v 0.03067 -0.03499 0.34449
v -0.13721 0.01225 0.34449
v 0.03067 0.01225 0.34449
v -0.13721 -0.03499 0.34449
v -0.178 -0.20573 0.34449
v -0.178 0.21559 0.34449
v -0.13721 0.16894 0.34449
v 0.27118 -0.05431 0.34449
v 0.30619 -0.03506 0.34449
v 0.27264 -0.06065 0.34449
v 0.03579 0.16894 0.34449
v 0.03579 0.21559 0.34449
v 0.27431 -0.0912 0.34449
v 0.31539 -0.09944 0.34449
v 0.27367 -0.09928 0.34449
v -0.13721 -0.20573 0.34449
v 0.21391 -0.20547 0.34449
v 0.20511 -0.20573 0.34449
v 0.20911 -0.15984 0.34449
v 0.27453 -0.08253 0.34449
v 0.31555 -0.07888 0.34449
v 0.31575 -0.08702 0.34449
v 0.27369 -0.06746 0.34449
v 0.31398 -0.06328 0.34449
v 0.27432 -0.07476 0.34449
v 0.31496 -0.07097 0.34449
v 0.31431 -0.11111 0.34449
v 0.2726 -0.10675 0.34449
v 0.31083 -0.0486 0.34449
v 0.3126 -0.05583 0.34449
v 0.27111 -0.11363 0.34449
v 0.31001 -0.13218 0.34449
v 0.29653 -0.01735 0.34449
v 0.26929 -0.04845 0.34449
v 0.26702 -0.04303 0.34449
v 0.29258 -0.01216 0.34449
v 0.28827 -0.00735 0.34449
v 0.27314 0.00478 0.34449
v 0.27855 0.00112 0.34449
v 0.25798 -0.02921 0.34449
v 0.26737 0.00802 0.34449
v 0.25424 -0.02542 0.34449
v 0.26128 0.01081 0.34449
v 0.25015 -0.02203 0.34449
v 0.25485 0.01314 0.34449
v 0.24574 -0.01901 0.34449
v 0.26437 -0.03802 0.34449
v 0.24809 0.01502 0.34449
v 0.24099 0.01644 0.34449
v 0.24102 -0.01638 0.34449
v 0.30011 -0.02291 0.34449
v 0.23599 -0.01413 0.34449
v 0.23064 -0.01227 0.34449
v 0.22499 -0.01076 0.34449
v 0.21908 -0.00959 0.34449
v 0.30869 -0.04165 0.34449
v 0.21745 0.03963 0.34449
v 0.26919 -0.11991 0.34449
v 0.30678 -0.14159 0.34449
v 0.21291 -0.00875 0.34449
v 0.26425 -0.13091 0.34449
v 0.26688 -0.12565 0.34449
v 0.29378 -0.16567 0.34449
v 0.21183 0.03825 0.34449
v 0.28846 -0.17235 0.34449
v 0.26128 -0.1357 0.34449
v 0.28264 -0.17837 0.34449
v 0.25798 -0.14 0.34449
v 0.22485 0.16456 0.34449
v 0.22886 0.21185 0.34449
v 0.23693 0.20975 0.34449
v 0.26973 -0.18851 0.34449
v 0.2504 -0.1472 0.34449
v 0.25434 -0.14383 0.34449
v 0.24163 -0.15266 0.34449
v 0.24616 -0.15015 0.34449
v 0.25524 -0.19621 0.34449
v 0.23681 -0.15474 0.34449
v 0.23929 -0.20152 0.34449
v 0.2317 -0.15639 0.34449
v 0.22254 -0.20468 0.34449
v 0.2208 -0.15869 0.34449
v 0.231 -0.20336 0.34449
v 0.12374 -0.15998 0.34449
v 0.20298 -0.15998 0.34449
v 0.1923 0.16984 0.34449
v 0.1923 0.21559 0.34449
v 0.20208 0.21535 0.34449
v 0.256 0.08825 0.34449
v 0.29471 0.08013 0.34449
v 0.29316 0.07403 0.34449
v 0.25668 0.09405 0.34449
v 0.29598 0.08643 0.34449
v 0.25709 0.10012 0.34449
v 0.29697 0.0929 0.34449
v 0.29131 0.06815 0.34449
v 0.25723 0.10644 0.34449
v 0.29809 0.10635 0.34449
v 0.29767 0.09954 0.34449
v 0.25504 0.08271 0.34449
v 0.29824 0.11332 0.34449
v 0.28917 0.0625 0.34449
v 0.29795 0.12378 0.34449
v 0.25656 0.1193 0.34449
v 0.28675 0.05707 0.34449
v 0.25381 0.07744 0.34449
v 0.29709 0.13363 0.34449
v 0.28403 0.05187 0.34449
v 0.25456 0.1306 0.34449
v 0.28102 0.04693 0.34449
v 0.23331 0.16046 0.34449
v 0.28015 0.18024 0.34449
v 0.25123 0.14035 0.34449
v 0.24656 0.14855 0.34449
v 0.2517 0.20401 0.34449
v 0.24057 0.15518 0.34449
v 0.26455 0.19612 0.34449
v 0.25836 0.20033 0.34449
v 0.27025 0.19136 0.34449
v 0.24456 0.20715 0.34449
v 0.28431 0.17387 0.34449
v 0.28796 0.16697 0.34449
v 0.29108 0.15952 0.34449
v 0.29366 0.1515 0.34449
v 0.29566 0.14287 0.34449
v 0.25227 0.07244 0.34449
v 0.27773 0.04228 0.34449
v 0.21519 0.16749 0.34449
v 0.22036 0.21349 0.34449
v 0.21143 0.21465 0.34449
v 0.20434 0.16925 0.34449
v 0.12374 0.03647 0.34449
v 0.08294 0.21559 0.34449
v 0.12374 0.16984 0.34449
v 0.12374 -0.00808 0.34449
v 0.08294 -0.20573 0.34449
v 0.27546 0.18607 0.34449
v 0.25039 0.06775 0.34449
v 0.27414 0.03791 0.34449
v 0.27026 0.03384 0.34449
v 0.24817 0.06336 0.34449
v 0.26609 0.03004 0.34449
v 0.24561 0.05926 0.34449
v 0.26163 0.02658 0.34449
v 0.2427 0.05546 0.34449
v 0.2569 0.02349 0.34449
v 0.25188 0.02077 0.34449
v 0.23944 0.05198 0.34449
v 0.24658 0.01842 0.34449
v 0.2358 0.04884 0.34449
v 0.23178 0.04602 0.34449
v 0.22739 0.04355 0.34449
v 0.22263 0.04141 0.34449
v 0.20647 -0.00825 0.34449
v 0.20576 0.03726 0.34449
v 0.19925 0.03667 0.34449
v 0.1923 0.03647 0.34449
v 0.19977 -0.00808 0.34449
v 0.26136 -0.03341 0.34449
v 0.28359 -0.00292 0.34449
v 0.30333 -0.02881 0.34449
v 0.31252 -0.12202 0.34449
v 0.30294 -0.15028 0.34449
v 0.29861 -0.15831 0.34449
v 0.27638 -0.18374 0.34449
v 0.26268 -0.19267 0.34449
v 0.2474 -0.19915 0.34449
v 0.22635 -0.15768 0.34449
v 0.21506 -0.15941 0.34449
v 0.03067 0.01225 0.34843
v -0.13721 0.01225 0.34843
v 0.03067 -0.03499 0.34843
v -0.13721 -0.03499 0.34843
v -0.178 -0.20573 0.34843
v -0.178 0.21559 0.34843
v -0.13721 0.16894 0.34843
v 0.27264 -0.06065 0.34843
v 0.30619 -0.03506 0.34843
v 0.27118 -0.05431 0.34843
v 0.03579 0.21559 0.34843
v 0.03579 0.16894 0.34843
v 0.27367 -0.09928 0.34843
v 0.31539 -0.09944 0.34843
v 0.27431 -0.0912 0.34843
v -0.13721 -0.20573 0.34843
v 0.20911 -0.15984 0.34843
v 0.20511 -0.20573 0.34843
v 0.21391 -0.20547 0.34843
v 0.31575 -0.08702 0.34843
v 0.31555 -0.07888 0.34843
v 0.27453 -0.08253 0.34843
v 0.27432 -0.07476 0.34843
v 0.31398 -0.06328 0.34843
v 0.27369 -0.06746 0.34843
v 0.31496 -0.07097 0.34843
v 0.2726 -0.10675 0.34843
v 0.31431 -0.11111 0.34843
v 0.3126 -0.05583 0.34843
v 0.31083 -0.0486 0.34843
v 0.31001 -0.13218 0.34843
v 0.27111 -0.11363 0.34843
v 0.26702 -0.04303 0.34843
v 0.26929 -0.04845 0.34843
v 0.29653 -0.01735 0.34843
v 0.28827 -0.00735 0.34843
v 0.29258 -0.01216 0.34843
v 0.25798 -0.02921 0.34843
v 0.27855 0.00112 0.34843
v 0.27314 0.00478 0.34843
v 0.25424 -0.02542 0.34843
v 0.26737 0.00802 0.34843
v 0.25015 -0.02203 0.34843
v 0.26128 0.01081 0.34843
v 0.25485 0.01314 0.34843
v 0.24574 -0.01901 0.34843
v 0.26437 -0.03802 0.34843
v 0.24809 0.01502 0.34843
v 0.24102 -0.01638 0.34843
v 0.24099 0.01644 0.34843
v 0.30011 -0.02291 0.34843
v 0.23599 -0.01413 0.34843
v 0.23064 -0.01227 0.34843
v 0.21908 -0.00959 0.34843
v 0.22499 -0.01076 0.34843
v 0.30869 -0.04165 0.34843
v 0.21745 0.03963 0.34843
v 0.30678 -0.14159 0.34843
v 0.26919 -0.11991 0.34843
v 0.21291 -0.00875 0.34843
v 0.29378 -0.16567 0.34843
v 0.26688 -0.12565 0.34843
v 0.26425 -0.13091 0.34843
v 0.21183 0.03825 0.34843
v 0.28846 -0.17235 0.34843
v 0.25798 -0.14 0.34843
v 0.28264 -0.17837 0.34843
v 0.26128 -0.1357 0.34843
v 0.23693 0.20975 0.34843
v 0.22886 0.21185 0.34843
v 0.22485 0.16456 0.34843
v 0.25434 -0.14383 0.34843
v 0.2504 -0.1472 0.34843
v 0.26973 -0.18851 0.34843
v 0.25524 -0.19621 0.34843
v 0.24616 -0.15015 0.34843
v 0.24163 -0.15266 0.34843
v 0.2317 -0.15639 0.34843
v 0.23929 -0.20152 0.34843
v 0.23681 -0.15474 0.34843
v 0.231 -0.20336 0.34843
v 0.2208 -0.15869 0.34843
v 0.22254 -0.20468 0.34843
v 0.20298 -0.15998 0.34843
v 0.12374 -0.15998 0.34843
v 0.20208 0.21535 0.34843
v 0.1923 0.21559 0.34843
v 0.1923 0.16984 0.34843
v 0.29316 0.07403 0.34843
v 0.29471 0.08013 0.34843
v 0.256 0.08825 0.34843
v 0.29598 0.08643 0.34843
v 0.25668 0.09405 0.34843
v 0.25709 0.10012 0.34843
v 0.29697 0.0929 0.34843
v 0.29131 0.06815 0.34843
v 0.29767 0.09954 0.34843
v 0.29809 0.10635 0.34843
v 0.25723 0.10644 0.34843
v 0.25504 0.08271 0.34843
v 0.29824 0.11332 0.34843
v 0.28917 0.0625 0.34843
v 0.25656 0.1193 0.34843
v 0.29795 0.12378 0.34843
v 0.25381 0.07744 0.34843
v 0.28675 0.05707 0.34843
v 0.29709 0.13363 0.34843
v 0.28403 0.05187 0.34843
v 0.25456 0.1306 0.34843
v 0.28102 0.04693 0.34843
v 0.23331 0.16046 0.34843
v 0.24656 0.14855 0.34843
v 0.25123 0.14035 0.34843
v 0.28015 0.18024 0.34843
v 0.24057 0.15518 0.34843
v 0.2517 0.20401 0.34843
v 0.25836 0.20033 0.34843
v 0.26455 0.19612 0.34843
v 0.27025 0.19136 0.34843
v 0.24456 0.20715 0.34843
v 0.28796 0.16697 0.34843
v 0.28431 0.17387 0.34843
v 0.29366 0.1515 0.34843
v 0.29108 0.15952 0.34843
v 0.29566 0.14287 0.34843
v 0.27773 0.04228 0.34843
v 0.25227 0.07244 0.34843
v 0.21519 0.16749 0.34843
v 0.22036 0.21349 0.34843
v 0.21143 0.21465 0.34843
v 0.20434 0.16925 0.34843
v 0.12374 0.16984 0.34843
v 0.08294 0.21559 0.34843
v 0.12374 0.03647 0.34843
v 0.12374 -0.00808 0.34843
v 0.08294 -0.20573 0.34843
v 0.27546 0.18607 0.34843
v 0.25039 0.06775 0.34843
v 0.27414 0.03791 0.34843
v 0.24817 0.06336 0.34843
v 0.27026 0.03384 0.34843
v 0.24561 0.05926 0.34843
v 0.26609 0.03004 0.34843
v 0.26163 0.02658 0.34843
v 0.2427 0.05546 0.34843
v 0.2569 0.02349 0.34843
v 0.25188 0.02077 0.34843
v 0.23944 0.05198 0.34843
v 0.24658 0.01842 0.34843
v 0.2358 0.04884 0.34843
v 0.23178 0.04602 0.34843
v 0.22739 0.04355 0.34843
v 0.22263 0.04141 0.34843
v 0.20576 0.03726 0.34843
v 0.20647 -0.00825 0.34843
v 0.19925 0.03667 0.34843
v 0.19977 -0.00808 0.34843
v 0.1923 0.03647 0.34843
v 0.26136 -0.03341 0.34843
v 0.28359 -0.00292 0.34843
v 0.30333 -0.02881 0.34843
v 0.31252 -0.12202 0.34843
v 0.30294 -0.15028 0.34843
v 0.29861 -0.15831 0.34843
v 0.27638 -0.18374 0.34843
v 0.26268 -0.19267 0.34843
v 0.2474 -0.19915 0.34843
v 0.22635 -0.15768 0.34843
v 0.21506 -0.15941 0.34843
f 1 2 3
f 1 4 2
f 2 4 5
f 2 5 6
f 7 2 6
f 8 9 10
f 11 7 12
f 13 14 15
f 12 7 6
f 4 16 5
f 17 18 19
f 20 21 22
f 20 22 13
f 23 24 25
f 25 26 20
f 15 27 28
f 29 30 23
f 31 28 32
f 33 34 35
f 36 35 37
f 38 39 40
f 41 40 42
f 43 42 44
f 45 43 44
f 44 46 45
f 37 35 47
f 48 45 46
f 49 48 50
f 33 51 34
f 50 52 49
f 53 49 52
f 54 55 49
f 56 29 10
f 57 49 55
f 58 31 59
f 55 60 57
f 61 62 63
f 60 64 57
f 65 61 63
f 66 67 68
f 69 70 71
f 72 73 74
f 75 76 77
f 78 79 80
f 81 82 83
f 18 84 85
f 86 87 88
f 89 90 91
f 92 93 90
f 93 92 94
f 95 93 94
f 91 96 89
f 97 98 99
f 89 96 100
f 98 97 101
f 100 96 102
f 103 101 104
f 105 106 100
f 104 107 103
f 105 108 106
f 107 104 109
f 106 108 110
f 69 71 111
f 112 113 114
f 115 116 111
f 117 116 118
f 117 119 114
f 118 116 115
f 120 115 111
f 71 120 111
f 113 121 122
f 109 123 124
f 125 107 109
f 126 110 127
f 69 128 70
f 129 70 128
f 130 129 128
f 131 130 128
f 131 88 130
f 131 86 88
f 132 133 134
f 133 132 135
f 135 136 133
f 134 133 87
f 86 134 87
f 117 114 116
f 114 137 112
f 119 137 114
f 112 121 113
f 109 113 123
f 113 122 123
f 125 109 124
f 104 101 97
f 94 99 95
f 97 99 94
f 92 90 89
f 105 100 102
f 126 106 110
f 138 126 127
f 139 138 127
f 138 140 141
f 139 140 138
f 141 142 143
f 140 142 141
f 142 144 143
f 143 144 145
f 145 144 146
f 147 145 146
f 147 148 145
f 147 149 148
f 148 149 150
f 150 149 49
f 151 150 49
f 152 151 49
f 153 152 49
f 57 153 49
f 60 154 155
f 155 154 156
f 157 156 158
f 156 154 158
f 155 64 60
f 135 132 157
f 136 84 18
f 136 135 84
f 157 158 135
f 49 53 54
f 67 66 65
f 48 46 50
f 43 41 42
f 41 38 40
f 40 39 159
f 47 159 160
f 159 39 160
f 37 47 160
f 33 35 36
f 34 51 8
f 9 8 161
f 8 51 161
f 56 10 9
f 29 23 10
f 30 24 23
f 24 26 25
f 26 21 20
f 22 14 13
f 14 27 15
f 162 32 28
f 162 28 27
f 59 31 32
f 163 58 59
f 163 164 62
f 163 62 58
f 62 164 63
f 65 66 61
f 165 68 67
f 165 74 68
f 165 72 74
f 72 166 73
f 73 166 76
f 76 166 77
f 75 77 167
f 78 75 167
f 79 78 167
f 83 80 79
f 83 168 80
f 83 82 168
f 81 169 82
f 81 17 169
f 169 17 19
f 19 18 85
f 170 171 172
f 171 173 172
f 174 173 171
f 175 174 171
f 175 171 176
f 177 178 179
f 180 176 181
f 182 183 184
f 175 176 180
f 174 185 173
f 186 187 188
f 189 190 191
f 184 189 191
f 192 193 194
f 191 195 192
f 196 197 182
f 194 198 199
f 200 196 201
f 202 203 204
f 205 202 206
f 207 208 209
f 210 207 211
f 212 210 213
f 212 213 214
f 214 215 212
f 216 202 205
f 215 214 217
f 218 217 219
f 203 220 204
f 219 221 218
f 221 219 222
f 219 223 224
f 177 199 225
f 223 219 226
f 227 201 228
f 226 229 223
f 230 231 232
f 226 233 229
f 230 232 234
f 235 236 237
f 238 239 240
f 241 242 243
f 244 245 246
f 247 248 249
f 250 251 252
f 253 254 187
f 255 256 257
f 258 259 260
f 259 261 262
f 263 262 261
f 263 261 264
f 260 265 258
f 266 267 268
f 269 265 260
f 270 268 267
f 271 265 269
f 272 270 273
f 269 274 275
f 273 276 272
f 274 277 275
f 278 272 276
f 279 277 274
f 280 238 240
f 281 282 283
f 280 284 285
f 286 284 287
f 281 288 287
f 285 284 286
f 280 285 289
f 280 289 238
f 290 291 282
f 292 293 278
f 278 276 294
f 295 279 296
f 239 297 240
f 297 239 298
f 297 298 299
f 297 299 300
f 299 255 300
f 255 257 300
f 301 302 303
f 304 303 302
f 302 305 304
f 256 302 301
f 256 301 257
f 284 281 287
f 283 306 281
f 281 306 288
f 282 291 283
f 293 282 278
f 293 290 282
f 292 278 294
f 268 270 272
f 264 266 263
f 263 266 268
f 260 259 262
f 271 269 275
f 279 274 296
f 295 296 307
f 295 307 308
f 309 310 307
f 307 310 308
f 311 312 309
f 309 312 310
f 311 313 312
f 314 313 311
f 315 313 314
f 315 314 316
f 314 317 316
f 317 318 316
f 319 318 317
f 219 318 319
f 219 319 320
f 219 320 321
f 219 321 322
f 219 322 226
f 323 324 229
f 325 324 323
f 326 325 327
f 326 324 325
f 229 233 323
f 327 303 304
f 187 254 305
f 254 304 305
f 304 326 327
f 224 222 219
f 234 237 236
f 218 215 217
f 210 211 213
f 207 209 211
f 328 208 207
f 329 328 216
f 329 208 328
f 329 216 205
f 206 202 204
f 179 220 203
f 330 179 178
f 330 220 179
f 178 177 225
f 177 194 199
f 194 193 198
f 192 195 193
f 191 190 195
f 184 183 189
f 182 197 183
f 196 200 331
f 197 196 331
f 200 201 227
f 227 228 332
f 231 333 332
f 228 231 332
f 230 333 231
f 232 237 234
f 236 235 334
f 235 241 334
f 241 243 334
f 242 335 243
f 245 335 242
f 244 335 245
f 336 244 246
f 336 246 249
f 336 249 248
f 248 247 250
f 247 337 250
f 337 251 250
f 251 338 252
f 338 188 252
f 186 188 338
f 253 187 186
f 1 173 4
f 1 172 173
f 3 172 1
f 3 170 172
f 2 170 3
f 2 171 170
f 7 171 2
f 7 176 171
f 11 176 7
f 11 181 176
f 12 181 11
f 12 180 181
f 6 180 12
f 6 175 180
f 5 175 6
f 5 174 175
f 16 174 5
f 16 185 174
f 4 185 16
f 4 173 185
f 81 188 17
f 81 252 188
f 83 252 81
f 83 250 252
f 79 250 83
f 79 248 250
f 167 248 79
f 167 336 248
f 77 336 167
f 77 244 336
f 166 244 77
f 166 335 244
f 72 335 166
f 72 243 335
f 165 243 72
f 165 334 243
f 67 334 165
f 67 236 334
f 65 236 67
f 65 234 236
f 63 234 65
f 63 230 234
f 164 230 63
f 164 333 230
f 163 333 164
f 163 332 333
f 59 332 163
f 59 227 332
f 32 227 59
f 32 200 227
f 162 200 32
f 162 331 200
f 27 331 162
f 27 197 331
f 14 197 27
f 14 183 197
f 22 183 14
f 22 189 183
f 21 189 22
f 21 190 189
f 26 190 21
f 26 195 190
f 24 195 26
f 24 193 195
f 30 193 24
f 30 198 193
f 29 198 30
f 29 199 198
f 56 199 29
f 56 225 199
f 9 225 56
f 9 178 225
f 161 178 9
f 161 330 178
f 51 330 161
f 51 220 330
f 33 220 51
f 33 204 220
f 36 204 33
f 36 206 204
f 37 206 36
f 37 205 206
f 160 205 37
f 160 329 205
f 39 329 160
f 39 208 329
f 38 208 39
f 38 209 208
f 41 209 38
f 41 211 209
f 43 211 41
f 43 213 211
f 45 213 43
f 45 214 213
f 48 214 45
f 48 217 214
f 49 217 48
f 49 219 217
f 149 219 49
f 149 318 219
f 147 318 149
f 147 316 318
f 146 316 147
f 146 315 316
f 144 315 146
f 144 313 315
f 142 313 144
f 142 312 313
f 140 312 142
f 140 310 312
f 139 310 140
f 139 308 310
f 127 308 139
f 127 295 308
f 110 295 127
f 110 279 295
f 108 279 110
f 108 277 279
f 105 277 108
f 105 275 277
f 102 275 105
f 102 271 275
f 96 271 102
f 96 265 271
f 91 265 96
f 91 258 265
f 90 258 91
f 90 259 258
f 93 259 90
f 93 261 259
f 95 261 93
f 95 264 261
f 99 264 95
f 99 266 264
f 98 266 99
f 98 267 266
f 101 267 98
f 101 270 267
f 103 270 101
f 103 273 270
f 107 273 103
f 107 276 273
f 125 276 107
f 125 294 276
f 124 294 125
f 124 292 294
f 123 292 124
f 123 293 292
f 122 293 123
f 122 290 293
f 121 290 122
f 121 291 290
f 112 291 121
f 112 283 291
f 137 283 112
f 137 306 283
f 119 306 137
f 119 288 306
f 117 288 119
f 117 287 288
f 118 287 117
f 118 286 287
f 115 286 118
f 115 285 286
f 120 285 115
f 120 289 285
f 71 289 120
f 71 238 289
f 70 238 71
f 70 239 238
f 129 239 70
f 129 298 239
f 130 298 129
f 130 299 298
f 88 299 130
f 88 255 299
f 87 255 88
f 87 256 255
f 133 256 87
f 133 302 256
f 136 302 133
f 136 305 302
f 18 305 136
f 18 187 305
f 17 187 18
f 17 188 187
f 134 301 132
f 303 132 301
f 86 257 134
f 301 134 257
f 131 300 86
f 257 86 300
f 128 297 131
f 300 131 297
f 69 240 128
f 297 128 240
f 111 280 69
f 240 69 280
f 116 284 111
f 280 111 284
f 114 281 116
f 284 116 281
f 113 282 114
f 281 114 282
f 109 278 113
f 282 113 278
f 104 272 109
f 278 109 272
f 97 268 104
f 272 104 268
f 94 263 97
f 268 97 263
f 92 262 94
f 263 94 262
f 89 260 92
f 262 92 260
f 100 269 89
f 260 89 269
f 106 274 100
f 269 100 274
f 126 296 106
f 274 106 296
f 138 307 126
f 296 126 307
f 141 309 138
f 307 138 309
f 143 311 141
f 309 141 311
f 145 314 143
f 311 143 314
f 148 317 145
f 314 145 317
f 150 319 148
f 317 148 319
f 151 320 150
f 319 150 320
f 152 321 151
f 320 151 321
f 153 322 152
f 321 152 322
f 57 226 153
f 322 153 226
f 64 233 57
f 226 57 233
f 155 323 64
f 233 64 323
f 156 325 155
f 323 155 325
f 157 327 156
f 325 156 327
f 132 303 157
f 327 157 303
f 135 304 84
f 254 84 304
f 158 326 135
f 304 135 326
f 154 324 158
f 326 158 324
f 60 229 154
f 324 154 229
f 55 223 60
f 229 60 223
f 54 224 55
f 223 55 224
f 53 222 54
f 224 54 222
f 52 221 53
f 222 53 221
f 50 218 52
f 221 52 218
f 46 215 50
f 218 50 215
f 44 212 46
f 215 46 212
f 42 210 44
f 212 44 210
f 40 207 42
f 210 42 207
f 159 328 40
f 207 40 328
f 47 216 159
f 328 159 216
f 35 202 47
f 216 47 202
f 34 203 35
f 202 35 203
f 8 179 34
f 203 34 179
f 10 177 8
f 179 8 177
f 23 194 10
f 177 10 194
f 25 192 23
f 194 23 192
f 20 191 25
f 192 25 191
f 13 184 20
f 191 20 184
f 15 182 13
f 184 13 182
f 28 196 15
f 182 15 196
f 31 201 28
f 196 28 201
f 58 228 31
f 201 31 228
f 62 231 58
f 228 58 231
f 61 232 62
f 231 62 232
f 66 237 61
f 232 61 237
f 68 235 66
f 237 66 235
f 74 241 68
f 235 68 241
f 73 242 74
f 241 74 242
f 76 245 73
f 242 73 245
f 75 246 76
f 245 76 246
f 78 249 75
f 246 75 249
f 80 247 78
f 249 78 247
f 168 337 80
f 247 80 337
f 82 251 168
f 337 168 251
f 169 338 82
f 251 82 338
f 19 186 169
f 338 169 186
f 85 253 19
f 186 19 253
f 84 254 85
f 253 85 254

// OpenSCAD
// file: defines.scad
A = 3.25;   // 3.00...3.50
B = 1.65;   // 1.50...1.80
C = 0.875;  // 0.45...0.75
D = 0.6;    // 0.10...0.75
E = 0.01;
/*E = 0.45;   // 0.25...0.65*/

pt = 0.1; // Толщина элеметов (дорожек, краски и т.п)
lab_mark = 0.3; // Полоска
plw = 0.02; // Толщина лужения

$fn = 32;

scale = 1/2.54;
// main file
include <defines.scad>

font = "Liberation Sans";
/*font = "DejaVu";*/
/*font = "Abyssinica SIL";*/

fscale = 0.08;

// Label
scale(scale) color("White") rotate([0,0,0]) {
  translate([lab_mark/2, 0, C]) {
    scale([fscale,fscale*1.4,1])
    linear_extrude(height = 0.01, center=false) {
      text("FB", font = font, valign="center", halign="center");
    }
  }
}
